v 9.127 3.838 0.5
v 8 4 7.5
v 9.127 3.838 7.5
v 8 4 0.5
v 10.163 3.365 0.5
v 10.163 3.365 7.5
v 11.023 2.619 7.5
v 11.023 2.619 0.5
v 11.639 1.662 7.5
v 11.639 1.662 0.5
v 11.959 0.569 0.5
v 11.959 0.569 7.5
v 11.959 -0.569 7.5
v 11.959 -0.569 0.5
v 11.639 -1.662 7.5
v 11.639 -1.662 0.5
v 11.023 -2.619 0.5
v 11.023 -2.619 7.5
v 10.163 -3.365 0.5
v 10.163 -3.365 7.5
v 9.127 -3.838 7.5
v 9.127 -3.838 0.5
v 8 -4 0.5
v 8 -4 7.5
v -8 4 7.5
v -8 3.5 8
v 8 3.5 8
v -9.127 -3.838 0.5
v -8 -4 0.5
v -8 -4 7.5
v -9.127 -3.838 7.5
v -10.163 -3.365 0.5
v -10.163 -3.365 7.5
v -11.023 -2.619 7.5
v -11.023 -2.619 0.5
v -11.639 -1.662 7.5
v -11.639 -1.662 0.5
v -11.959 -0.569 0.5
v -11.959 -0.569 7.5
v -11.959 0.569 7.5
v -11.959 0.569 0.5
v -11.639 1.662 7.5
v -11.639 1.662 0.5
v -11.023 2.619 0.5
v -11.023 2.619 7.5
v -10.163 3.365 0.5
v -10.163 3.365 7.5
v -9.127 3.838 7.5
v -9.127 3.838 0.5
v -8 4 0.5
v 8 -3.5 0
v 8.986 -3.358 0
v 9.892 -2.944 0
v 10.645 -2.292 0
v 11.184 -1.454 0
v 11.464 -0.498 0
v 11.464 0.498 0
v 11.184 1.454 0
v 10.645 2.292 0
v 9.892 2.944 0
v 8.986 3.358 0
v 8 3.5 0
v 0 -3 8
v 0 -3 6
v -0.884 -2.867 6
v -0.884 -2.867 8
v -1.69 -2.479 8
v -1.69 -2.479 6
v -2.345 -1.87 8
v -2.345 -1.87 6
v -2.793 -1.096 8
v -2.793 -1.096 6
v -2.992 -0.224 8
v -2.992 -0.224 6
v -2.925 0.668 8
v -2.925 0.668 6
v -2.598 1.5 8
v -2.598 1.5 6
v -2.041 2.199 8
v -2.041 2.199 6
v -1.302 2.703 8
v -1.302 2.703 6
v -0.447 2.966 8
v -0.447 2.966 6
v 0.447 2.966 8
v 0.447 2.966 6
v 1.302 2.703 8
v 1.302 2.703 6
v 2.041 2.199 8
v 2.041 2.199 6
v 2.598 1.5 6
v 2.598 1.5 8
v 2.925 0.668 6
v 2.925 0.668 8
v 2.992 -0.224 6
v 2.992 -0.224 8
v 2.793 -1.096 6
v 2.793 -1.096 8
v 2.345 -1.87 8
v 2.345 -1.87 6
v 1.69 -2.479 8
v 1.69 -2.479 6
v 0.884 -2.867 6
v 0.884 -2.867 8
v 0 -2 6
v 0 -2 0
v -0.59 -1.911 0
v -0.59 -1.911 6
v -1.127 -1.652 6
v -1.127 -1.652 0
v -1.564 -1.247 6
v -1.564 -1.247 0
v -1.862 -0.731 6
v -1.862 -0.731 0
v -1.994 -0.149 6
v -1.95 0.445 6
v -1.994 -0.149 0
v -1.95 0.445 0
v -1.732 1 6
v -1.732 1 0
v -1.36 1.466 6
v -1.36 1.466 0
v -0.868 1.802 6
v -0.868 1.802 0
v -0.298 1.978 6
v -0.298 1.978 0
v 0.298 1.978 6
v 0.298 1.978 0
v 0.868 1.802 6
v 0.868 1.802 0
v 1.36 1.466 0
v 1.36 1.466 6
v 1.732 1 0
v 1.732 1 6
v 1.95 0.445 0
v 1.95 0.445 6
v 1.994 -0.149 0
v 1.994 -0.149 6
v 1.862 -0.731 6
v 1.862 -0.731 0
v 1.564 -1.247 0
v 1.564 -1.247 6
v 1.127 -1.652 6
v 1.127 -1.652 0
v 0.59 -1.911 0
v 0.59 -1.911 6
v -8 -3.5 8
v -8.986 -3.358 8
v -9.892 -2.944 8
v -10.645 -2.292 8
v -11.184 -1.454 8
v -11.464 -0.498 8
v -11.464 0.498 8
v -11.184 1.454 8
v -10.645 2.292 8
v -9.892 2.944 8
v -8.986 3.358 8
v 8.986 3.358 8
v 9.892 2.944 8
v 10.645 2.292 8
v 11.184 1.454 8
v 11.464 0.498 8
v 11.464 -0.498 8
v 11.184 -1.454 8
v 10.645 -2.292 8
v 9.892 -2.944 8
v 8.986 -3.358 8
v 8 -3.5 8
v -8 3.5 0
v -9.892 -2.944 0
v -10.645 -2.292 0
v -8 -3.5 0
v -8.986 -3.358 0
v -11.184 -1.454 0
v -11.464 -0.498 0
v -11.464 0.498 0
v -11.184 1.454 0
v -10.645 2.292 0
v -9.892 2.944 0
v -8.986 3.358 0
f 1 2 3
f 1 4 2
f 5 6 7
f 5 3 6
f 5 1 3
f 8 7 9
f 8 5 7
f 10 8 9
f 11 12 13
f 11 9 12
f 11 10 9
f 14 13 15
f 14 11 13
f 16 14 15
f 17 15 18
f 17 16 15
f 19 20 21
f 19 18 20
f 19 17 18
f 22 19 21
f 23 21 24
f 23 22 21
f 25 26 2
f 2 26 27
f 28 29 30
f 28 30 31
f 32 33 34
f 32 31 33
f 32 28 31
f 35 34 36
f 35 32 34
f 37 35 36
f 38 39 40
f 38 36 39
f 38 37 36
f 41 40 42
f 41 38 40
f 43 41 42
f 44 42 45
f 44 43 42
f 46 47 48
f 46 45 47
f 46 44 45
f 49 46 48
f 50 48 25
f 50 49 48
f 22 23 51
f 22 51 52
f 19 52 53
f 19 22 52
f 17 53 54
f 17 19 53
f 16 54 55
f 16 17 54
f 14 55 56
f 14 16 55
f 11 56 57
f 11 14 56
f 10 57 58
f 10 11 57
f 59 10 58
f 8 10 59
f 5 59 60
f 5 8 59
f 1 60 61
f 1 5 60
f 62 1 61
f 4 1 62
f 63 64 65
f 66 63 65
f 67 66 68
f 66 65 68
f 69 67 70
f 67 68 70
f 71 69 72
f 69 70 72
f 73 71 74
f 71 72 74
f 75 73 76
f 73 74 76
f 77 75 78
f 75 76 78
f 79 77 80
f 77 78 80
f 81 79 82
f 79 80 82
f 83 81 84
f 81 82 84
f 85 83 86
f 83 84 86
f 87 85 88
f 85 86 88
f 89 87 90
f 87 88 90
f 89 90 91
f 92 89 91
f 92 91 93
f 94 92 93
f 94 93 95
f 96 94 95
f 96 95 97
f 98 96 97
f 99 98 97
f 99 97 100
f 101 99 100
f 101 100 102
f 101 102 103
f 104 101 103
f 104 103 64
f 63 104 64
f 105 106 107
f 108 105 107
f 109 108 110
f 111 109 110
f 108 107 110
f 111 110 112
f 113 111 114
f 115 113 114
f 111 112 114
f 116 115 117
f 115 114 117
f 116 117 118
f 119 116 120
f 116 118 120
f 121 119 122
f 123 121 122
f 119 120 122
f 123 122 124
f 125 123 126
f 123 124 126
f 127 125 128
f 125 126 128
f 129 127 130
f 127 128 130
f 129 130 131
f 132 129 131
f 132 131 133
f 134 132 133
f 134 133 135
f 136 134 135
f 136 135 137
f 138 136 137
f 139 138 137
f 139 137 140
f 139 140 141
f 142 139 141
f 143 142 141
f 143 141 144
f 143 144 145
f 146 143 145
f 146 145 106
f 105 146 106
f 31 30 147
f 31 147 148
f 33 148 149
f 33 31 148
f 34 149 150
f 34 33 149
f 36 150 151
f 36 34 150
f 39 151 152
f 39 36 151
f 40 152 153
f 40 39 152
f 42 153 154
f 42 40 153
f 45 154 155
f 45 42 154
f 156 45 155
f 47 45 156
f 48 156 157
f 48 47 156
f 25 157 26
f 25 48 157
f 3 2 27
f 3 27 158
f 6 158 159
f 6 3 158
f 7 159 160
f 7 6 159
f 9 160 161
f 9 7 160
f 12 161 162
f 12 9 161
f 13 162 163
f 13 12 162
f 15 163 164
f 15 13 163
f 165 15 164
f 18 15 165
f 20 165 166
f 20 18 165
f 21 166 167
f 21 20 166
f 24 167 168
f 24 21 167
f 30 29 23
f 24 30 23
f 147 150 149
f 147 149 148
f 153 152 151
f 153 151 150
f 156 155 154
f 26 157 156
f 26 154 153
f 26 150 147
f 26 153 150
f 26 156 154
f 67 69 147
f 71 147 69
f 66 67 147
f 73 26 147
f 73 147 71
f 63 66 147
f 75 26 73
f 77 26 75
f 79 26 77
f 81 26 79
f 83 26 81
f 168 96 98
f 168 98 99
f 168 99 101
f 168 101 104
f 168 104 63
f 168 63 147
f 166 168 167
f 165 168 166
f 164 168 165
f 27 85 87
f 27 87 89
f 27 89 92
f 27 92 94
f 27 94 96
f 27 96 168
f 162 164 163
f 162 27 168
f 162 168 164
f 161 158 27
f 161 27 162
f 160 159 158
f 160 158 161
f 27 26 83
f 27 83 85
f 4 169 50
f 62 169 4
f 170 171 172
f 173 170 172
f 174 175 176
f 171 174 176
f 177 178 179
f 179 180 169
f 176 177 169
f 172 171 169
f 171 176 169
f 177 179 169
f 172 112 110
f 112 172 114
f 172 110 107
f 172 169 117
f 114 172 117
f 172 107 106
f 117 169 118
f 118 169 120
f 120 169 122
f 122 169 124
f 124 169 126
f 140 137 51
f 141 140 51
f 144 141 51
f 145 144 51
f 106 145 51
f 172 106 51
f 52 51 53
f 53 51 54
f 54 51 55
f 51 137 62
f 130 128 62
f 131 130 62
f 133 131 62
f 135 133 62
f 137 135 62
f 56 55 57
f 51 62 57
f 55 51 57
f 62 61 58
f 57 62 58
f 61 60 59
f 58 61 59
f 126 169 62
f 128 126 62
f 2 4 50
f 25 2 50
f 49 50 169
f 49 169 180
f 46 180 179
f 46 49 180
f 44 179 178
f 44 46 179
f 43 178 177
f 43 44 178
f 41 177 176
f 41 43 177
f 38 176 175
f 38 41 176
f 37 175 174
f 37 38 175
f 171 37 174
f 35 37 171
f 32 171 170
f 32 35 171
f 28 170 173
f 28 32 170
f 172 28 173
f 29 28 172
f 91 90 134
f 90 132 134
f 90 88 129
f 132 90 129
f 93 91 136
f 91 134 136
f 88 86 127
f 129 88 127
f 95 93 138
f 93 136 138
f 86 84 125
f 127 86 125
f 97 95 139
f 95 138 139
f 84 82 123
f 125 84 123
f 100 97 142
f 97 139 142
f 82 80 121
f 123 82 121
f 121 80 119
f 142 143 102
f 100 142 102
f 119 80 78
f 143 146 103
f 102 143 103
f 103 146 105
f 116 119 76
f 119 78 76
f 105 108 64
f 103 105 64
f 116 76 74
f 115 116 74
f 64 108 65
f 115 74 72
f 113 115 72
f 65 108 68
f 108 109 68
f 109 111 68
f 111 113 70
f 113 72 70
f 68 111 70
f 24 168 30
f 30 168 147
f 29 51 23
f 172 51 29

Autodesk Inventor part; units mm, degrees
ref_plane "YZ Plane" through (0, 0, 0) normal (1, 0, 0) x (0, 1, 0)
ref_plane "XZ Plane" through (0, 0, 0) normal (0, 1, 0) x (-1, 0, 0)
ref_plane "XY Plane" through (0, 0, 0) normal (0, 0, 1) x (1, 0, 0)
sketch "Sketch1" plane through (0, 0, 0) normal (0, 0, 1) x (1, 0, 0)
  line L0 (-8, 0) -> (8, 0) construction
  line L1 (-8, -4) -> (8, -4)
  line L2 (8, 4) -> (-8, 4)
  arc A0 (-8, 4) -> (-8, -4) centre (-8, 0) ccw
  arc A1 (8, -4) -> (8, 4) centre (8, 0) ccw
  point P0 (0, 0)
  dimension "d0" = 16
  dimension "d1" = 4
extrude "Extrusion1" add sketch "Sketch1" along normal blind 8
chamfer "Chamfer1" distance 0.5 angle 45 8 edges at (0, 4, 8) (-12, 0, 8) (0, -4, 8) (12, 0, 8) (0, 4, 0) (-12, 0, 0) (0, -4, 0) (12, 0, 0)
sketch "Sketch2" plane through (0, 0, 8) normal (0, 0, 1) x (1, 0, 0)
  point P0 (0, 0)
hole "Hole1" at (0, 0, 8) direction (0, 0, -1) diameter 4 end through all counterbore diameter 6 counterbore depth 2
properties part number "Slider" material "Steel"
